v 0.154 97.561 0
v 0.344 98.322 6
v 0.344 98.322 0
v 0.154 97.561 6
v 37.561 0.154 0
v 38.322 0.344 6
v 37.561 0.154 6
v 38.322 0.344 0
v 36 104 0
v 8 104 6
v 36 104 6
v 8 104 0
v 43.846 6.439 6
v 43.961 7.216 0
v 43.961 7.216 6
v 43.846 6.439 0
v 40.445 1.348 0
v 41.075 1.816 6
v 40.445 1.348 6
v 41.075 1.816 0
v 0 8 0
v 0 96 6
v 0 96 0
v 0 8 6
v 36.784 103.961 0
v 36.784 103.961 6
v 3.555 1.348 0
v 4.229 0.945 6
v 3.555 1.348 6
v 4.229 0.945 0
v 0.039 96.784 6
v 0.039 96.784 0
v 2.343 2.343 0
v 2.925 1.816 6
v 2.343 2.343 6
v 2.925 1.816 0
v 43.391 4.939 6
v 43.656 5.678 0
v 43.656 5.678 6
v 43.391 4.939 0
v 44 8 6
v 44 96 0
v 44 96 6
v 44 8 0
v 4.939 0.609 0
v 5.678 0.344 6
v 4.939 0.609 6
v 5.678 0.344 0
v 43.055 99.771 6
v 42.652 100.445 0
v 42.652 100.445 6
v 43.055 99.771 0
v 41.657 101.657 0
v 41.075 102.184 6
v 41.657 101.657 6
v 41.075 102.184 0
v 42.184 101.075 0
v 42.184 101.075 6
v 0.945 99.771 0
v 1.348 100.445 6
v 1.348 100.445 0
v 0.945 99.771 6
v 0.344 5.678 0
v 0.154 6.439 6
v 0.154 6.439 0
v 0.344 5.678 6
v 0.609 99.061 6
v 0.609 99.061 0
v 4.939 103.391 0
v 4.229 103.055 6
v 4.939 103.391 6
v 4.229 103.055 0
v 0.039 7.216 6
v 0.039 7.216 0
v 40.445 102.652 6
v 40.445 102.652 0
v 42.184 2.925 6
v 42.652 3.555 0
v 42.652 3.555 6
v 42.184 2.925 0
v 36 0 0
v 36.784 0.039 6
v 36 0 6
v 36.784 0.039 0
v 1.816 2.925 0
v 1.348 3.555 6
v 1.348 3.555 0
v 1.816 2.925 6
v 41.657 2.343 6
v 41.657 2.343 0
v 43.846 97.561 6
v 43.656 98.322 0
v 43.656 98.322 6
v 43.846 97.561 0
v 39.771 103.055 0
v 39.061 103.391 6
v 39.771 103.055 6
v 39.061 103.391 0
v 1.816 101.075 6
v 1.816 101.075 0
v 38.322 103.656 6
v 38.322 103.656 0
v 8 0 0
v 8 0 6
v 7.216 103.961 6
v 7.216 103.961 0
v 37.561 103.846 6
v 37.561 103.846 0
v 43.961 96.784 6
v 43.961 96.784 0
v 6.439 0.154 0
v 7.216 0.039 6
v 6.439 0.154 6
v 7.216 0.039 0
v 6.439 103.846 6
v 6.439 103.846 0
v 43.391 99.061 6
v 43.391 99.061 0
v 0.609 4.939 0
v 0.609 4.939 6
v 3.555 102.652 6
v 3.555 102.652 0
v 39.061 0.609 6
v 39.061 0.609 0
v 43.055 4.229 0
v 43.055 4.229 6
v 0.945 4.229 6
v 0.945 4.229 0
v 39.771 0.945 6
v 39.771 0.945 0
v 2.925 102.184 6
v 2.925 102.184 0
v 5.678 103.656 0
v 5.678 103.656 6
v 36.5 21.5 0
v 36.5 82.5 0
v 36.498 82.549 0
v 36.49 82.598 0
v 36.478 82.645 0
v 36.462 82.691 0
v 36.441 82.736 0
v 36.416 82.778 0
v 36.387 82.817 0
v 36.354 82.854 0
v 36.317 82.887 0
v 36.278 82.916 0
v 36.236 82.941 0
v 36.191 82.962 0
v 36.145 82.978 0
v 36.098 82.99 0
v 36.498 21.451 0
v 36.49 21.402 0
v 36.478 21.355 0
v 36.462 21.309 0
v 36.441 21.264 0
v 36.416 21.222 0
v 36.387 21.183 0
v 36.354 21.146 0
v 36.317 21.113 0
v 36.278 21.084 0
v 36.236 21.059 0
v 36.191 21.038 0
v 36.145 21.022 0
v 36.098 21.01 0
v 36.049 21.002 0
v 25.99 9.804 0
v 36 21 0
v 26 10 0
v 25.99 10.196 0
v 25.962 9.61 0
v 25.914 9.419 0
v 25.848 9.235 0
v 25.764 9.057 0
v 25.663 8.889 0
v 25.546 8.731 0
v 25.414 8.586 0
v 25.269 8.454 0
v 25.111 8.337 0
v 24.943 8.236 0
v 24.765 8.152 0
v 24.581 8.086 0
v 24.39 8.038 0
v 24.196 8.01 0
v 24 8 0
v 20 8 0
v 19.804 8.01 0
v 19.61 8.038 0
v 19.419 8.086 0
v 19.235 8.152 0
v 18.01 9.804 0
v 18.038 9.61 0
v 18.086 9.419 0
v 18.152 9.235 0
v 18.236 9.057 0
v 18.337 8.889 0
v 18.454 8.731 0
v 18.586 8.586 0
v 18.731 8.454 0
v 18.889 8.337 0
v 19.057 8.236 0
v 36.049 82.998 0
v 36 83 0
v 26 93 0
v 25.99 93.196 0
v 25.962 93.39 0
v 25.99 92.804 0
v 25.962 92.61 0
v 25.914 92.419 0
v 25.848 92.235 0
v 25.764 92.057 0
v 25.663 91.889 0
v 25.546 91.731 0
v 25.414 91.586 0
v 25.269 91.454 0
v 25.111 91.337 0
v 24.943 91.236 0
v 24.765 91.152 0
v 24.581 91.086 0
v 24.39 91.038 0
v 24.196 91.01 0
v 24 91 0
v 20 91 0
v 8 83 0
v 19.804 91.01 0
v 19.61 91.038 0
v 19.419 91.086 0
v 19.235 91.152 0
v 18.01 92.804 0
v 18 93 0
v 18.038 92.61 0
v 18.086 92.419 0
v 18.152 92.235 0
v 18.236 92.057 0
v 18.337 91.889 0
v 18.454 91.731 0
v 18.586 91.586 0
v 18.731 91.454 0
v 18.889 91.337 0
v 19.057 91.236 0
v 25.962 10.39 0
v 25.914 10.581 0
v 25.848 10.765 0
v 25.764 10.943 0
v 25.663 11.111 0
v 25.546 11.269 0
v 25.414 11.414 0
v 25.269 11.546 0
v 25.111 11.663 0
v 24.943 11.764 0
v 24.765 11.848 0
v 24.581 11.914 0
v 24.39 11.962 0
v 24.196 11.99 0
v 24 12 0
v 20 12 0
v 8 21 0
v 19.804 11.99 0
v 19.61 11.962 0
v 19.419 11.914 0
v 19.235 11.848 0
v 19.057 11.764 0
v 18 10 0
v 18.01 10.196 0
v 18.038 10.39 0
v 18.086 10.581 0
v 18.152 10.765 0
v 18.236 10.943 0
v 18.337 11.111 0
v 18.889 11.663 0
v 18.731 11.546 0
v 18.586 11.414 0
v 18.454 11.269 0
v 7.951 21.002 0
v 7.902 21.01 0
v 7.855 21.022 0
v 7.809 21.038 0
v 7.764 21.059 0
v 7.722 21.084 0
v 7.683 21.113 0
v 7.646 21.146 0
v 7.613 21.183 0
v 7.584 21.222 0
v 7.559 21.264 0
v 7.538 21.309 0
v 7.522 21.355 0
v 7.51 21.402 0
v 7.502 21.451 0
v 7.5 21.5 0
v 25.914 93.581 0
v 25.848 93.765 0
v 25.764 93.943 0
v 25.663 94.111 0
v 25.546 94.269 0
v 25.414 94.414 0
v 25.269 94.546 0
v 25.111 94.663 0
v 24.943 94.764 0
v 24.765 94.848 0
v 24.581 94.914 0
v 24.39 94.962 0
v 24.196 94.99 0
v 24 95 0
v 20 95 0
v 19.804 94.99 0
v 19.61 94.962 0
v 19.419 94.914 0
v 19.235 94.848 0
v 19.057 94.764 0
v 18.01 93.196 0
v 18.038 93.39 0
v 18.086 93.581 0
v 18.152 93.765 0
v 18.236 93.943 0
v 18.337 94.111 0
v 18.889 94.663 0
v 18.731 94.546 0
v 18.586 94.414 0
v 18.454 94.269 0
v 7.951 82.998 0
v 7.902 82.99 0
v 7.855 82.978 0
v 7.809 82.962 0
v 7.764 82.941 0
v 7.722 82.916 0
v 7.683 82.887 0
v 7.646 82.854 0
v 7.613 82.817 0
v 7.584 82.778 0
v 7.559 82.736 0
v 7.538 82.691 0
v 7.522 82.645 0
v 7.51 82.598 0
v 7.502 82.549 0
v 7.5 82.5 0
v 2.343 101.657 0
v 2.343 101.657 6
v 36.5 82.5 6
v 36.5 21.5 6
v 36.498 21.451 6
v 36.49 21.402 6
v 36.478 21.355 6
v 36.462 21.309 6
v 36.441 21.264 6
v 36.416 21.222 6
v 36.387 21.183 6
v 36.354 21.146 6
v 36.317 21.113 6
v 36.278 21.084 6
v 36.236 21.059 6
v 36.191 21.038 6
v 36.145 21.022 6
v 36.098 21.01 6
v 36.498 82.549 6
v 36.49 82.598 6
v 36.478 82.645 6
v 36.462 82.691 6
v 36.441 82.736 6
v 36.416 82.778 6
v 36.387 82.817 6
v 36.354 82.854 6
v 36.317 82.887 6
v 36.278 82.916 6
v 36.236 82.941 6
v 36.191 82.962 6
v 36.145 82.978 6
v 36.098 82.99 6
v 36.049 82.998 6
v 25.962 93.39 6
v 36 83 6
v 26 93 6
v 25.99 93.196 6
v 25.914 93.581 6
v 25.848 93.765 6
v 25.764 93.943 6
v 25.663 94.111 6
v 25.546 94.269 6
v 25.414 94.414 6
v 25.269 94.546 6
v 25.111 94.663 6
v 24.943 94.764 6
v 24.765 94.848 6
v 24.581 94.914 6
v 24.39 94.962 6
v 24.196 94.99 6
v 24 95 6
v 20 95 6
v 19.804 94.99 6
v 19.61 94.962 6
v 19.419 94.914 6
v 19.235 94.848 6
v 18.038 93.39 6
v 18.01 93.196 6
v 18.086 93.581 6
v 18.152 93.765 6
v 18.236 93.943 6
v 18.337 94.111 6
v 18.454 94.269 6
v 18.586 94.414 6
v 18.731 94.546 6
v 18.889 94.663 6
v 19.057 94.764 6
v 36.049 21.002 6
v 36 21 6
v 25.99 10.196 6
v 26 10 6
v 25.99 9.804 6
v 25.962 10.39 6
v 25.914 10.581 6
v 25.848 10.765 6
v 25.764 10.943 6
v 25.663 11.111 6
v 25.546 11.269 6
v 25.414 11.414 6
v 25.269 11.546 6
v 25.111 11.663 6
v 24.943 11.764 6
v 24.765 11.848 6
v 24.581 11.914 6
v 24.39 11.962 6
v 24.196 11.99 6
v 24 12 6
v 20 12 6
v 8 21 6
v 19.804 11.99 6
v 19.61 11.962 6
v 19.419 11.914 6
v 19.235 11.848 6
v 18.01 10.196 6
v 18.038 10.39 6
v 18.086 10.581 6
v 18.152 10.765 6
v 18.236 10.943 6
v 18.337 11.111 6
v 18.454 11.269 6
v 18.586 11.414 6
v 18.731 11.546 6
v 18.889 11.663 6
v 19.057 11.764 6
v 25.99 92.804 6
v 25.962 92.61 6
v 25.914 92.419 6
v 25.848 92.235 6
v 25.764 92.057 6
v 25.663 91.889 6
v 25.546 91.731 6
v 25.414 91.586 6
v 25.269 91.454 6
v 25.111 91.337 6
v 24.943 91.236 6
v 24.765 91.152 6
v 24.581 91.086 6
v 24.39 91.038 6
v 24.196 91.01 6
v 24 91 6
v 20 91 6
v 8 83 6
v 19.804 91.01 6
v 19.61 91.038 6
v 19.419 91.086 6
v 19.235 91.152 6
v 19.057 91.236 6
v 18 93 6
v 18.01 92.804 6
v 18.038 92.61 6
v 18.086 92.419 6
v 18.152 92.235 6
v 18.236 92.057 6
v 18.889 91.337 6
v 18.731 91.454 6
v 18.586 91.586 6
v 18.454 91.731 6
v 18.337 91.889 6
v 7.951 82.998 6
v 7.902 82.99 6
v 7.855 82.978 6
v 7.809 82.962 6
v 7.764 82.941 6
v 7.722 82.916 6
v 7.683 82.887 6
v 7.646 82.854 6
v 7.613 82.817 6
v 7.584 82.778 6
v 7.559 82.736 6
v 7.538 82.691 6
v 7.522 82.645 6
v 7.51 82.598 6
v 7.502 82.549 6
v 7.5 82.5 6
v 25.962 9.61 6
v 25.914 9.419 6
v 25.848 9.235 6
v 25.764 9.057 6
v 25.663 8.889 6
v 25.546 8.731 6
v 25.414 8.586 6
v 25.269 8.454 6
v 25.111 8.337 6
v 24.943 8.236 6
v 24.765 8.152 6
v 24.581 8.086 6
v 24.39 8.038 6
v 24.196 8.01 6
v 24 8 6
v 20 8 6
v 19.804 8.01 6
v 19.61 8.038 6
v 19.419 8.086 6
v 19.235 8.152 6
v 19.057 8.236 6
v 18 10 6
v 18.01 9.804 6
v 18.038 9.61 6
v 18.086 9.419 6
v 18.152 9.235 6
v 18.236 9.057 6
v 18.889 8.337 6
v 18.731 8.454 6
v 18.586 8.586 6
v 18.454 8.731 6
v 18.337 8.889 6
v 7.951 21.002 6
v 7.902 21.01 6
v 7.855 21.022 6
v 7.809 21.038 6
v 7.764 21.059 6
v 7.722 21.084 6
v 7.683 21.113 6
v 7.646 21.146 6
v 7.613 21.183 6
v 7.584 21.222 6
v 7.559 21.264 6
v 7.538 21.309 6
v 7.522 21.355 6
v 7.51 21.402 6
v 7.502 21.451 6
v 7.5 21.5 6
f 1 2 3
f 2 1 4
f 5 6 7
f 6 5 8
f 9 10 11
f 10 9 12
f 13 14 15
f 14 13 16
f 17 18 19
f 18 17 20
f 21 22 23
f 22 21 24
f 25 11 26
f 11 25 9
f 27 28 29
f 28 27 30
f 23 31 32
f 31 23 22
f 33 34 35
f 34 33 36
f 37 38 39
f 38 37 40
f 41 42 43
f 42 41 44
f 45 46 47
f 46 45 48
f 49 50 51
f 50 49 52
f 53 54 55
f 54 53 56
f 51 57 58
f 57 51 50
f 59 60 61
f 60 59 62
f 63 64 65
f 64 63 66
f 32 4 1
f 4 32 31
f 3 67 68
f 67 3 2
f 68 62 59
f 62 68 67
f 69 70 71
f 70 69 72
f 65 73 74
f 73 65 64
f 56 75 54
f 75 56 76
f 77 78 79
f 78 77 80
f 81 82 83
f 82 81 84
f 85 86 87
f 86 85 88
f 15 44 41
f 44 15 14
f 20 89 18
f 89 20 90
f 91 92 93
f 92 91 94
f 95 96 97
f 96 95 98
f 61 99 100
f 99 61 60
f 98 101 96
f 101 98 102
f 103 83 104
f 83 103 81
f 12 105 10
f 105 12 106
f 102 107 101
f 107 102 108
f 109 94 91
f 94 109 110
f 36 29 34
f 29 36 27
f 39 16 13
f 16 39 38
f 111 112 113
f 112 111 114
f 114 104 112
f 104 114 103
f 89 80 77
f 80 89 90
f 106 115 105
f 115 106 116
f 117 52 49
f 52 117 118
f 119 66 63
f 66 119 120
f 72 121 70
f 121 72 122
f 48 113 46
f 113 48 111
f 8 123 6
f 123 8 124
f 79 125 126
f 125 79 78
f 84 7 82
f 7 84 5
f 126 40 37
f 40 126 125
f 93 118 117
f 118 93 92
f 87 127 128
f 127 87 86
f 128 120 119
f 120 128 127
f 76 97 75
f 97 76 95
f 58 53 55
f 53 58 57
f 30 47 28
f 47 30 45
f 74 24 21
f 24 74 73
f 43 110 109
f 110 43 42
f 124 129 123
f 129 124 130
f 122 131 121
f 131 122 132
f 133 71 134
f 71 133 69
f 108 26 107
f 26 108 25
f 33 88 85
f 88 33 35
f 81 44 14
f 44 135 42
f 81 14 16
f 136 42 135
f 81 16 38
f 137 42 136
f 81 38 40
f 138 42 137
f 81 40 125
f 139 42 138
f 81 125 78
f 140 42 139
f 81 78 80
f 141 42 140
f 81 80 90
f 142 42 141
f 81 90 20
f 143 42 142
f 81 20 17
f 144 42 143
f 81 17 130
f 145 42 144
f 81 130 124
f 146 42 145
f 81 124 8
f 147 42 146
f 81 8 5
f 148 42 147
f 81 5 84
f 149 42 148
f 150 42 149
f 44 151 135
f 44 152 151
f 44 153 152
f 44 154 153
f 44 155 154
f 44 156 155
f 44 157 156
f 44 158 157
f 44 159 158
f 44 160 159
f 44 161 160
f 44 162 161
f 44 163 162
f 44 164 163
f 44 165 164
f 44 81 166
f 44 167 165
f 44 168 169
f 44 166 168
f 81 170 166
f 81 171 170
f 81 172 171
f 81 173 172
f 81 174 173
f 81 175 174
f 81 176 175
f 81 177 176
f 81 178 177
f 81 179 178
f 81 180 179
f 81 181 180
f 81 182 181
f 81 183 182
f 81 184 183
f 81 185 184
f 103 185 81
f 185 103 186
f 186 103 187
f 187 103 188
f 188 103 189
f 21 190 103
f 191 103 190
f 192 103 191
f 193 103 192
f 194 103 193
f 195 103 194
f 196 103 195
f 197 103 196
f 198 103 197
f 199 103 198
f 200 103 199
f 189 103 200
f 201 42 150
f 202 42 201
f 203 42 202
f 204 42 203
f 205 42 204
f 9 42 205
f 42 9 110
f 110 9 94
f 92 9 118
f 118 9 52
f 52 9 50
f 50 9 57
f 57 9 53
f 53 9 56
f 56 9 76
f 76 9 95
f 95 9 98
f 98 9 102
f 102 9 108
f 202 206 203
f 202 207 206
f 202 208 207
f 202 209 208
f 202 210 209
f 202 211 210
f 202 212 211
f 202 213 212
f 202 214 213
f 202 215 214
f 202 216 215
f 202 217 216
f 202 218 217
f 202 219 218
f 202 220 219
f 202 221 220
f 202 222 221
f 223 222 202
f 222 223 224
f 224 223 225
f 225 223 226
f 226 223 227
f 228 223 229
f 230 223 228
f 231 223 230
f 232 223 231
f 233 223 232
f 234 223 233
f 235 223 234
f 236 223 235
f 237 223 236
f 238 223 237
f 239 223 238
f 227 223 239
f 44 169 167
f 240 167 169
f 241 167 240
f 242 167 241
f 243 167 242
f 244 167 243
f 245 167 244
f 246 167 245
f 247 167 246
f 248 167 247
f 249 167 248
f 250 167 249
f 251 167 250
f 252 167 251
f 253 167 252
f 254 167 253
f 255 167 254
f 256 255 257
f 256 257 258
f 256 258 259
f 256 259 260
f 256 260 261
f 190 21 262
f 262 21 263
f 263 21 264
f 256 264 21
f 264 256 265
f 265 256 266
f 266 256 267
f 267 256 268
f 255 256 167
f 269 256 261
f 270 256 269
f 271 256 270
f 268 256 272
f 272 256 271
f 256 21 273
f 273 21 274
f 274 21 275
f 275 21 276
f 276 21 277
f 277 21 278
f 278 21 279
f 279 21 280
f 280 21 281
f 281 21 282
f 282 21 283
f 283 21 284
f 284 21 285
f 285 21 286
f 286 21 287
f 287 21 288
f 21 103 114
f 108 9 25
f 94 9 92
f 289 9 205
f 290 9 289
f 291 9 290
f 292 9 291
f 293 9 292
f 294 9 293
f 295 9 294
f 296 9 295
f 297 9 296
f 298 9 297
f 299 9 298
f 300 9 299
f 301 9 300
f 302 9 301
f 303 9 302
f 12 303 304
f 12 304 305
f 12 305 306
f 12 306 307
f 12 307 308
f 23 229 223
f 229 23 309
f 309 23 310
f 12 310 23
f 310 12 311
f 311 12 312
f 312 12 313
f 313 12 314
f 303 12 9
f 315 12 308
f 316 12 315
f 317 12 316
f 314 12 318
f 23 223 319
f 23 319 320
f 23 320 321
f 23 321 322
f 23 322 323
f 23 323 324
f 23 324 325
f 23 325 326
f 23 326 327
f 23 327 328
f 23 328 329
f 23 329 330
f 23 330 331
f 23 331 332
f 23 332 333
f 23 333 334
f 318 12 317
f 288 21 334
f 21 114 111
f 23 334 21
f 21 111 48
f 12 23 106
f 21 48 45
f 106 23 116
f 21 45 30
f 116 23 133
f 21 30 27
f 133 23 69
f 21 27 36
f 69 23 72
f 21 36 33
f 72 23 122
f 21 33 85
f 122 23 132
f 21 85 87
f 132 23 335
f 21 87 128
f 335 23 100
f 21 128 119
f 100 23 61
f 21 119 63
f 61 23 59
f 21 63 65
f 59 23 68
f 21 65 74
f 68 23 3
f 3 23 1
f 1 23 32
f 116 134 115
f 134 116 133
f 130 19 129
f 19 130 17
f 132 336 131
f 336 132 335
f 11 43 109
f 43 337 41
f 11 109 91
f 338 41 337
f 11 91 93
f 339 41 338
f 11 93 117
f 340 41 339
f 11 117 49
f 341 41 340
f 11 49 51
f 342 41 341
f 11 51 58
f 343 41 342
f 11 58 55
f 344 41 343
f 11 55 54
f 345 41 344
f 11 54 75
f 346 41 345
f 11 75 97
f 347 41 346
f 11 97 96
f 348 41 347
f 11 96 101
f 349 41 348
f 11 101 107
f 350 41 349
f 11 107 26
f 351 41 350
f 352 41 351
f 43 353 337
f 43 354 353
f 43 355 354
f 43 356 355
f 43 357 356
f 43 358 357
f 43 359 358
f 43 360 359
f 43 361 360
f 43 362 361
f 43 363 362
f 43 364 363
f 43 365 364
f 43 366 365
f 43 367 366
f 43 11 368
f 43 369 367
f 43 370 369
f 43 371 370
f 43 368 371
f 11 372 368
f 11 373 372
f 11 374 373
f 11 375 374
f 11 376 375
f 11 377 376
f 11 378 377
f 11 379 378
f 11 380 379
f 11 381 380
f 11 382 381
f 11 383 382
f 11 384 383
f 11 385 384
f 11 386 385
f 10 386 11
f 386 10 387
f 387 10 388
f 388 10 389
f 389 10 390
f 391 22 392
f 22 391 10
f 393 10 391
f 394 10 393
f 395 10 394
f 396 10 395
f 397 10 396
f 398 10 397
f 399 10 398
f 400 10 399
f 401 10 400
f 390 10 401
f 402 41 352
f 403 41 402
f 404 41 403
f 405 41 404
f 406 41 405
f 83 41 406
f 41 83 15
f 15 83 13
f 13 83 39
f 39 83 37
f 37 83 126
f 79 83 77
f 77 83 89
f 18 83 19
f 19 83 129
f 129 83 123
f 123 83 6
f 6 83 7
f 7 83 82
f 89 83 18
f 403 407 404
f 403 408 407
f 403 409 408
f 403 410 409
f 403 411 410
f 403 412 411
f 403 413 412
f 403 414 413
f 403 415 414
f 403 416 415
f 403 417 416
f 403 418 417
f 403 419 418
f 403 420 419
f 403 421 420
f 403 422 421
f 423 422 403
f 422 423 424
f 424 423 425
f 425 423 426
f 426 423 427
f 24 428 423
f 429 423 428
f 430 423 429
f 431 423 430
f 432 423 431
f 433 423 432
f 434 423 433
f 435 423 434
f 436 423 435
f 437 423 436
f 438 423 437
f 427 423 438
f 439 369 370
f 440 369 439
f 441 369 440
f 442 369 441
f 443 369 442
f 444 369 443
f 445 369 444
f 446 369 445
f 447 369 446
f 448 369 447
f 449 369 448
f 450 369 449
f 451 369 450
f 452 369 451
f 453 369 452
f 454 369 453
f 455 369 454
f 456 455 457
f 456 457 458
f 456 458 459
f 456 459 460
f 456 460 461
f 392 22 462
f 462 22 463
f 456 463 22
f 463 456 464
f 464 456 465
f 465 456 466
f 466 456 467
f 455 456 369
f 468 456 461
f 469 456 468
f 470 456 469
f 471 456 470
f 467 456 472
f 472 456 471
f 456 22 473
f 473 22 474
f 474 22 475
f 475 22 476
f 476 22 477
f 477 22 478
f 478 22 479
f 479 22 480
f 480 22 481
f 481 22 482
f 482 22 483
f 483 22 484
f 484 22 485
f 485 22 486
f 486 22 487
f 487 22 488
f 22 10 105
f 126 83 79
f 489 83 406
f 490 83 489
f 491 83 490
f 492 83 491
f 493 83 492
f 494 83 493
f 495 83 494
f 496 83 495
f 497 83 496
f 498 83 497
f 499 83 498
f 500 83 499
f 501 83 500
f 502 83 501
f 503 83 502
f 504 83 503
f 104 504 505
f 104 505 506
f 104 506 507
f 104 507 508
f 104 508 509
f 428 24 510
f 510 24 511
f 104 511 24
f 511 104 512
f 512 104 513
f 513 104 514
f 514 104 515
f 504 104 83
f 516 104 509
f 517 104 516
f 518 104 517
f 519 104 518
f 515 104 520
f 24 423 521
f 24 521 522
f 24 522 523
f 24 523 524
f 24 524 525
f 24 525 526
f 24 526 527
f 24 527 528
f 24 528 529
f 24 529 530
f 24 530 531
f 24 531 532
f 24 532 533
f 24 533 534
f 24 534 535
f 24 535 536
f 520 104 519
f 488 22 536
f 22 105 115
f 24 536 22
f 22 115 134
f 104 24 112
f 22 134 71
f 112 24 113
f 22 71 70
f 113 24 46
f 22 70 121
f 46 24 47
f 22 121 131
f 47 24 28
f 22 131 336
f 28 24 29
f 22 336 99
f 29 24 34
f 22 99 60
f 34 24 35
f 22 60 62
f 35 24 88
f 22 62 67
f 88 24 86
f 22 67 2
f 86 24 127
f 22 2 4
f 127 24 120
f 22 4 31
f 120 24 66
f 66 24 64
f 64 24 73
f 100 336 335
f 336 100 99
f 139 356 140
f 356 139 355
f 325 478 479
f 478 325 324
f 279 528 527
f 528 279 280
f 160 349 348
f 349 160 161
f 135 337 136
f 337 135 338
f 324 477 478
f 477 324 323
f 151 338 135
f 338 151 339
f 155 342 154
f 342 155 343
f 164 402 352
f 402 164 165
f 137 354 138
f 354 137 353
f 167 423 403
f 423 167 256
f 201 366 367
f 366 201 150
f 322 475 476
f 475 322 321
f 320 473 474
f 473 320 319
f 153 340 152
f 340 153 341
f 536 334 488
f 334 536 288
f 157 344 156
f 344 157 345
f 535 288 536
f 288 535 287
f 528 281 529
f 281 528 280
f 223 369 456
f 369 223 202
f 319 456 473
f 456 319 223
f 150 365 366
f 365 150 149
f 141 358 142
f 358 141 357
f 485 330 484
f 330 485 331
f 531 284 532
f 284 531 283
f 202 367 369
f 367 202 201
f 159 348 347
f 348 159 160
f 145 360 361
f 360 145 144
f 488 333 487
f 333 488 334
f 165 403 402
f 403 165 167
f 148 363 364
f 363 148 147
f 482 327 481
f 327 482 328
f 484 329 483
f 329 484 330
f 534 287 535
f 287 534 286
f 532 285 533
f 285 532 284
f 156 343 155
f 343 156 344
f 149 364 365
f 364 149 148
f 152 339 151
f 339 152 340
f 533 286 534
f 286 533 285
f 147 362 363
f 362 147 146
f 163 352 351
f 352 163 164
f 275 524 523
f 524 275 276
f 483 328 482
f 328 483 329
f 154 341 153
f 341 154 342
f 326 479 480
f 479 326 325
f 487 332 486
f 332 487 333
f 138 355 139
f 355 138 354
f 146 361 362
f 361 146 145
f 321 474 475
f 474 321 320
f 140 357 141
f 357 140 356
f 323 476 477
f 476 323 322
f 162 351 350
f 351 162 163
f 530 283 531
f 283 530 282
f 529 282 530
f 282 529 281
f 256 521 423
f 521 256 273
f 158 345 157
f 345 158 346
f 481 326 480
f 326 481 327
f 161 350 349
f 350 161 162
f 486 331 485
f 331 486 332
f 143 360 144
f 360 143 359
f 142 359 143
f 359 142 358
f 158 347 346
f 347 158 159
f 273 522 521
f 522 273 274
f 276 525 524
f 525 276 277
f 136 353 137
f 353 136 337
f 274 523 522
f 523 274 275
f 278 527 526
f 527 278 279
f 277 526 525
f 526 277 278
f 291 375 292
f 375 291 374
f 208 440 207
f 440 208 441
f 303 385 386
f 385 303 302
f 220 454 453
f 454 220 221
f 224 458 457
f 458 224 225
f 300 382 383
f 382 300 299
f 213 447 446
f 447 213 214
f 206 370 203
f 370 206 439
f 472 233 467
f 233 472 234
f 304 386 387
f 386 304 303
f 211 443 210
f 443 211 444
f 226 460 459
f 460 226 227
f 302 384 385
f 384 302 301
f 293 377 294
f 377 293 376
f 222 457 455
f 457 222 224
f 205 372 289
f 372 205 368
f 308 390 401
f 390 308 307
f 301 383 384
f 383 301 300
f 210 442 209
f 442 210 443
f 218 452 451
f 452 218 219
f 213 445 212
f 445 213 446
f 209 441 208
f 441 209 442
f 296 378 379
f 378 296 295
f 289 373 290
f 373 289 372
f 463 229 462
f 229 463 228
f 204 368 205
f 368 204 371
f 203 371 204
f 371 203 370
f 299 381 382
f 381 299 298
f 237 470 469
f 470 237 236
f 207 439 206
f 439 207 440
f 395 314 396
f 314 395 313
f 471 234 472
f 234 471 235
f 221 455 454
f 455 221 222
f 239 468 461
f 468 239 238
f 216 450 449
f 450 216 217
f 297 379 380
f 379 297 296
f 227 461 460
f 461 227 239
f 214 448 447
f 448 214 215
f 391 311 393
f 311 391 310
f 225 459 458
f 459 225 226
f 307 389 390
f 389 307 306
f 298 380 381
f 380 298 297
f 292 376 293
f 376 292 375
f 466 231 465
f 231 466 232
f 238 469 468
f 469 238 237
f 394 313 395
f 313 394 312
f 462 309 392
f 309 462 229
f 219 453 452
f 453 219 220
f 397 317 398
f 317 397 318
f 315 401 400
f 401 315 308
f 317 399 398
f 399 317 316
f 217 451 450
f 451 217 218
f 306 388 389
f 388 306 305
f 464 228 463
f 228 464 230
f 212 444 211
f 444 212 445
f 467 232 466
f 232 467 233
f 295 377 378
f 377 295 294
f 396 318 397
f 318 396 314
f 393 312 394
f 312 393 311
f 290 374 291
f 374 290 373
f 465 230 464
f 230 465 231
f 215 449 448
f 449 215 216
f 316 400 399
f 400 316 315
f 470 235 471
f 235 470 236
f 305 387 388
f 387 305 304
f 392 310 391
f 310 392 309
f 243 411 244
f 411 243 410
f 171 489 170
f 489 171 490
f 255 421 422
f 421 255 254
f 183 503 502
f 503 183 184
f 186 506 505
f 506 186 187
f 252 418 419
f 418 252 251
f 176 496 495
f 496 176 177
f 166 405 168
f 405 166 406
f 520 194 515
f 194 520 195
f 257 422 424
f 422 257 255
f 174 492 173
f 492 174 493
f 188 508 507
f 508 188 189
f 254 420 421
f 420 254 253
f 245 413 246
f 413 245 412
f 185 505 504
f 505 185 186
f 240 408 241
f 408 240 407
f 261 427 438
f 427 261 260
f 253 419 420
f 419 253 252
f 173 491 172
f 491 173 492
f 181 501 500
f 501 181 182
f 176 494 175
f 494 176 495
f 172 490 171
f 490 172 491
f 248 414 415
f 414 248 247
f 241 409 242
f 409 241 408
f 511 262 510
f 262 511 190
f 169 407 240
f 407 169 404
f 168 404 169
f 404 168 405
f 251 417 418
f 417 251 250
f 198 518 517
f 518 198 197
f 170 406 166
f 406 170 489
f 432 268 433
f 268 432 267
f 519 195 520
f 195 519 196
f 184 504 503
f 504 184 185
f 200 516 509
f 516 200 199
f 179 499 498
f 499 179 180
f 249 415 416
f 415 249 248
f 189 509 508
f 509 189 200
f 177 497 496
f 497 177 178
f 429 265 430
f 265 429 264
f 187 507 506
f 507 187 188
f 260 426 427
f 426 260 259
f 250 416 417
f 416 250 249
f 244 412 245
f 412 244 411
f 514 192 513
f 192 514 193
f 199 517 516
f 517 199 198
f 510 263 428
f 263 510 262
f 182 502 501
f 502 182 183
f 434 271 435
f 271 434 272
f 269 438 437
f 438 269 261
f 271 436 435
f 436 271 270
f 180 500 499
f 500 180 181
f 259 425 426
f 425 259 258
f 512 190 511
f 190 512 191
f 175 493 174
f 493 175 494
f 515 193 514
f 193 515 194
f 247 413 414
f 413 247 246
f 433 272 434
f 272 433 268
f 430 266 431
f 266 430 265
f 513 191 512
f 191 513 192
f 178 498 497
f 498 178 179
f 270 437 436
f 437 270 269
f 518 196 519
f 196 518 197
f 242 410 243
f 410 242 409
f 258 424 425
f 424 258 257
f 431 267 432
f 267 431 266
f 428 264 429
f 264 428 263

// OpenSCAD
// file: modules/Modules.scad
/*
	This program is free software: you can redistribute it and/or modify
	it under the terms of the GNU General Public License as published by
	the Free Software Foundation, either version 3 of the License, or
	(at your option) any later version.

	This program is distributed in the hope that it will be useful,
	but WITHOUT ANY WARRANTY; without even the implied warranty of
	MERCHANTABILITY or FITNESS FOR A PARTICULAR PURPOSE.  See the
	GNU General Public License for more details.
	
	Purpose:  Hold general use modules for to simplify making of objects
	
	History:	
		01/25/2024	Initial creation
		02/17/2025	Added modules for roundedCube, roundedCylinder
								and FilletedCylinder
		02/23/2025	refactored filletedCylinder to include tapered cylinders
								reference filletedCylinderV1 to see original

*/

/***********************************************************************
****** Module - screwHole
	Create a hole specifically for a screw to go in.
***********************************************************************/
//screwHole();
module screwHole(screwHole=4.5, screwDepth = 10, screwHead = 9, headTaper = 2.3, screwHeadDepth = 5, s=$fn){
	$fn = s;
	// Common size screws
	
    translate([0,0,-headTaper])cylinder(d1=screwHole, d2=screwHead, h = headTaper, $fn=20);
    translate([0,0,-headTaper-screwDepth])cylinder(d=screwHole, h=screwDepth, $fn=10);
    translate([0,0,-headTaper-screwDepth])cylinder(d=screwHole, h=screwDepth, $fn=10);
    translate([0,0,0]) cylinder(d=screwHead, h=screwHeadDepth, $fn=10);
}

/***********************************************************************
****** Module - roundedCube
	4 various ways to make a cube with soft rounded sides.
***********************************************************************/
//roundedCube(x=50, y=30, z=20, r=5, xyz="x");
//roundedCube(x=50, y=30, z=20, r=5, xyz="y");
//roundedCube(x=50, y=30, z=20, r=5, xyz="z");
//roundedCube(x=50, y=30, z=20, r=5, xyz="all");
//roundedCube(x=50, y=30, z=20, r=5, xyz="all", s=60);
//roundedCube(x=50, y=30, z=20, r=5, xyz="all", s=$fn);
module roundedCube(x=50, y=30, z=20, r=5, xyz="z", s=$fn){
	/* variable definitions
			x = value for x axis
			y = value for y axis
			z = value for z axis
			r = radius
			xyz = axis to have the sides rounded
	*/
	$fn = s;
	hull(){
		if (xyz == "z") {
			translate([r,r,0])cylinder(h=z, r=r);
			translate([x-r,r,0])cylinder(h=z, r=r);
			translate([r,y-r,0])cylinder(h=z, r=r);
			translate([x-r,y-r,0])cylinder(h=z, r=r);
		} else if (xyz == "y") {
			translate([r,0,r])rotate([-90,0,0])cylinder(h=y, r=r);
			translate([x-r,0,r])rotate([-90,0,0])cylinder(h=y, r=r);
			translate([r,0,z-r])rotate([-90,0,0])cylinder(h=y, r=r);
			translate([x-r,0,z-r])rotate([-90,0,0])cylinder(h=y, r=r);
		} else if (xyz == "x") {
			translate([0,r,r])rotate([0,90,0])cylinder(h=x, r=r);
			translate([0,y-r,r])rotate([0,90,0])cylinder(h=x, r=r);
			translate([0,r,z-r])rotate([0,90,0])cylinder(h=x, r=r);
			translate([0,y-r,z-r])rotate([0,90,0])cylinder(h=x, r=r);
		} else if (xyz == "all") {
			minkowski(){
				translate([r,r,r])cube([x-r*2,y-r*2,z-r*2]);
				sphere(r=r);
			}			
		} else { 
			echo("XYZ not set");
		}
	}
}

/***********************************************************************
******* Module - roundedCylinder
	Create a cylinder with nice rounded outter top and bottom
***********************************************************************/
//roundedCylinder();
//roundedCylinder(d=200, h=100, r=5);
//roundedCylinder(td=100, bd=100, tr= 10, br = .1);
//difference(){roundedCylinder(d=20, h=10, r=1, s=60);filletedCylinder(d=5, h=10, tr=2, br=1, pad=0, s=30);}
module roundedCylinder(d=200, td=0, bd=0, h=100, r=5, tr=0, br=0, s=$fn){
	$fn = s;

	// Calulate for one or two radises
	tRad = tr > 0 ? tr : r;
	bRad = br > 0 ? br : r;
	//echo(tRad, bRad);

	// Calculate for one diamater or two.
	tDia = td > 0 ? td : d;
	bDia = bd > 0 ? bd : d;
	//echo(tDia, bDia);

	hull(){
		//Bottom
		translate([0,0,bRad])rotate_extrude()translate([bDia/2-bRad,0,0])circle(r=bRad);
		//Top
		translate([0,0,h-tRad])rotate_extrude()translate([tDia/2-tRad,0,0])circle(r=tRad);
	}
}

/***********************************************************************
******* Module - filletedCylinder
	Create a cylinder with flared top and/or bottoms.
	Used for making rounded top/bottom holes in objects.
	Usage:
		d = diamater
		td = top diamater.  d will be used if not provided
		dd = bottom diamater.  d will be used if not provided
		h = height
		r = radius of the fillet
		tr = top radius.  r will be used if not provided
		br = bottom radius.  r will be used if not provided
		pad = filler around the radius  5 is usually good unless very small
		s = smoothing.  generally let $fn of the object do the work.
***********************************************************************/
//filletedCylinder();
//filletedCylinder(d=50, h=100, r=5, pad=5, s=$fn);
//filletedCylinder(d=10, h=20, tr=1, br=1, pad=.1, s=60);
//difference(){roundedCylinder();filletedCylinder();}
//difference(){roundedCylinder(d=200, h=100, r=5);filletedCylinder(d=50, h=100, tr=10, br=5, pad=5);}
//difference(){roundedCylinder(d=20, h=10, r=1, s=30);filletedCylinder(d=5, h=10, tr=2, br=1, pad=0, s=30);}
//filletedCylinder(d=50, td=20, bd=60, h=100, tr=10, br=5, pad=5, s=$fn);
//difference(){roundedCylinder(s=60);filletedCylinder(d=50, td=50, bd=20, h=100, tr=10, br=5, pad=5, s=$fn);}
module filletedCylinder(d=50, td=0, bd=0, h=100, tr=0, br=0, r=5, pad=5, s=$fn){
	$fn = s;
	shift = .1;

	// Calulate for one or two radises
	tRad = tr > 0 ? tr : r;
	bRad = br > 0 ? br : r;
	//echo(tRad, bRad);

	// Calculate for one diamater or two.
	tDia = td > 0 ? td : d;
	bDia = bd > 0 ? bd : d;
	//echo(tDia, bDia);

	// Calculate the shift of the radius in due to angle of a cone
  trShift = tDia > bDia ? tRad * tan(atan(((tDia/2)-(bDia/2))/h)) : 0;
	brShift = bDia > tDia ? bRad * tan(atan(((bDia/2)-(tDia/2))/h)) : 0;
	//echo(trShift, brShift);

	translate([0,0,-shift])cylinder(h=h+shift*2, r1=bDia/2, r2=tDia/2);
	if ( bRad > 0 ){
		// bottom
		translate([0,0,-shift])
			difference(){
				rotate_extrude()translate([bDia/2-pad-brShift,0,0])square([bRad+pad, bRad]);
				rotate_extrude()translate([bDia/2+bRad-brShift,bRad,0])circle(r=bRad);
			}
	}
	if ( tRad > 0 ){
		// top
		translate([0,0,h-tRad+shift])
			difference(){
				rotate_extrude()translate([tDia/2-pad-trShift,0,0])square([tRad+pad, tRad]);
				rotate_extrude()translate([tDia/2+tRad-trShift,0,0])circle(r=tRad);
			}
	}
}

		// v1 kept for reference.  No longer used
		// module filletedCylinderV1(d=50, h=100, tr=10, br=5, pad=5, s=$fn){
		// 	$fn = s;
		// 	shift = .1;
		// 	translate([0,0,-shift])cylinder(h=h+shift*2, r=d/2);
		// 	if ( br > 0 ){
		// 		// bottom
		// 		translate([0,0,-shift])
		// 			difference(){
		// 				rotate_extrude()translate([d/2-pad,0,0])square([br+pad, br]);
		// 				rotate_extrude()translate([d/2+br,br,0])circle(r=br);
		// 			}
		// 	}
		// 	if ( tr > 0 ){
		// 		// top
		// 		translate([0,0,h-tr+shift])
		// 			difference(){
		// 				rotate_extrude()translate([d/2-pad,0,0])square([tr+pad, tr]);
		// 				rotate_extrude()translate([d/2+tr,0,0])circle(r=tr);
		// 			}
		// 	}
		// }

/***********************************************************************
******* Module - CylinderFillet
	Fillet the outter circumfrence of a cylinder.
***********************************************************************/
//difference(){cylinder(h=20, d=100);cylinderFillet(d = 100, r=5);}
/*difference(){
	cylinder(h=20, d=100);
	cylinderFillet(d = 100, r=5);
	translate([0,0,20])rotate([180,0,0])cylinderFillet(d = 100, r=5, s=60);
}*/
module cylinderFillet(d = 100, r=5, s=$fn){
		$fn = s;
		pad = 0.1;	// Padding to maintain manifold
		translate([0,0,0])
		difference() {
				rotate_extrude(convexity=10)
						translate([d/2-r+pad,-pad,0])
								square(r+pad,r+pad);
				#rotate_extrude(convexity=10)
						translate([d/2-r,r,0])
								circle(r=r);
		}
}
// main file
/*
	This program is free software: you can redistribute it and/or modify
	it under the terms of the GNU General Public License as published by
	the Free Software Foundation, either version 3 of the License, or
	(at your option) any later version.

	This program is distributed in the hope that it will be useful,
	but WITHOUT ANY WARRANTY; without even the implied warranty of
	MERCHANTABILITY or FITNESS FOR A PARTICULAR PURPOSE.  See the
	GNU General Public License for more details.
	
	Purpose:  Create a spacer to flush mount the shelly BLE switch
	GitHub:		
	
	History:	
		09/07/2025	Initial creation

	Notes:
		- Switch:  https://us.shelly.com/products/shelly-blu-rc-button-4?utm_source=google&utm_medium=organic&utm_campaign=Google%20May%2025&utm_content=Shelly%20BLU%20RC%20Button%204&srsltid=AfmBOoq12DYrTYY6V_eNJ0h2owDhJB2qVwWpHTZULMgSqNE6oslAbitkSmE

*/

/****** Variables ******************************************************
***********************************************************************/
OutterWidth = 44;						//
OutterHeight = 104;					//
CornerRadius = 8;						//
InnerWidth = 29;						//
InnerHeight = 62;						//
ObjThickness = 6;						//
screwHole = 4;							// size of the screw hole
screwBottom = 8;						// distance of bottom screw hole up from bottom
screwTop = 91;							// distance of top screw hole up from bottom

// Special variables
$fn = $preview ? 32 : 64;		// 0 is OpenSCAD default

/****** Imports & Includes & Calculations ******************************
***********************************************************************/
include <modules/Modules.scad>

// Global Calculations


/****** The Object *****************************************************
***********************************************************************/
object();

module object(){
	// Rendered Calculations
	InnerWidthOffset = (OutterWidth-InnerWidth)/2;
	InnerHeightOffset = (OutterHeight-InnerHeight)/2;
	HoleSideOffset = (OutterWidth-(screwHole*2))/2;

	// Start creating the object
	difference(){
		roundedCube(x=OutterWidth, y=OutterHeight, z=ObjThickness, r=CornerRadius, xyz="z");
		// cutout
		translate([InnerWidthOffset,InnerHeightOffset,-1])roundedCube(x=InnerWidth, y=InnerHeight, z=ObjThickness+2, r=.5, xyz="z");
		// top screw
			translate([HoleSideOffset,screwTop,-1])#roundedCube(x=screwHole*2, y=screwHole, z=ObjThickness+2, r=2, xyz="z");
		// bottom screw
			translate([HoleSideOffset,screwBottom,-1])#roundedCube(x=screwHole*2, y=screwHole, z=ObjThickness+2, r=2, xyz="z");
	}
}

/*Some basic commands
translate([0,0,0])
rotate([0,0,0])
cube([0,0,0]);
difference(){}
*/



/****** Batch Export***************************************************
	Use this module to create multiple exports based on rerenderd values
	https://github.com/bbaumg/3DPrinter/blob/master/export.py
	<modules/export.py>
	
	This script searches for "module export()" and individually renders
	and exports each item in it. Each item is expected to be on its own line. 
	The file name will be the comment on the same line, or the module 
	call if no comment exists. All files will be put in a folder with 
	the same name as the scad file it's created from.
***********************************************************************/
module export() {
	//objectExport(x); //<filename.stl>
}

// Calls this to make minor tweaks for batch rendering
//   e.g. rotation of the object for best viewing
module objectExport(var1){
	echo("Rendering Export");
	// Allows for rotation of object for best orientation of STL file
	//    Likely need to rotate 90-180 on z axis.
	rotate([0,0,0])object(var1);
}
